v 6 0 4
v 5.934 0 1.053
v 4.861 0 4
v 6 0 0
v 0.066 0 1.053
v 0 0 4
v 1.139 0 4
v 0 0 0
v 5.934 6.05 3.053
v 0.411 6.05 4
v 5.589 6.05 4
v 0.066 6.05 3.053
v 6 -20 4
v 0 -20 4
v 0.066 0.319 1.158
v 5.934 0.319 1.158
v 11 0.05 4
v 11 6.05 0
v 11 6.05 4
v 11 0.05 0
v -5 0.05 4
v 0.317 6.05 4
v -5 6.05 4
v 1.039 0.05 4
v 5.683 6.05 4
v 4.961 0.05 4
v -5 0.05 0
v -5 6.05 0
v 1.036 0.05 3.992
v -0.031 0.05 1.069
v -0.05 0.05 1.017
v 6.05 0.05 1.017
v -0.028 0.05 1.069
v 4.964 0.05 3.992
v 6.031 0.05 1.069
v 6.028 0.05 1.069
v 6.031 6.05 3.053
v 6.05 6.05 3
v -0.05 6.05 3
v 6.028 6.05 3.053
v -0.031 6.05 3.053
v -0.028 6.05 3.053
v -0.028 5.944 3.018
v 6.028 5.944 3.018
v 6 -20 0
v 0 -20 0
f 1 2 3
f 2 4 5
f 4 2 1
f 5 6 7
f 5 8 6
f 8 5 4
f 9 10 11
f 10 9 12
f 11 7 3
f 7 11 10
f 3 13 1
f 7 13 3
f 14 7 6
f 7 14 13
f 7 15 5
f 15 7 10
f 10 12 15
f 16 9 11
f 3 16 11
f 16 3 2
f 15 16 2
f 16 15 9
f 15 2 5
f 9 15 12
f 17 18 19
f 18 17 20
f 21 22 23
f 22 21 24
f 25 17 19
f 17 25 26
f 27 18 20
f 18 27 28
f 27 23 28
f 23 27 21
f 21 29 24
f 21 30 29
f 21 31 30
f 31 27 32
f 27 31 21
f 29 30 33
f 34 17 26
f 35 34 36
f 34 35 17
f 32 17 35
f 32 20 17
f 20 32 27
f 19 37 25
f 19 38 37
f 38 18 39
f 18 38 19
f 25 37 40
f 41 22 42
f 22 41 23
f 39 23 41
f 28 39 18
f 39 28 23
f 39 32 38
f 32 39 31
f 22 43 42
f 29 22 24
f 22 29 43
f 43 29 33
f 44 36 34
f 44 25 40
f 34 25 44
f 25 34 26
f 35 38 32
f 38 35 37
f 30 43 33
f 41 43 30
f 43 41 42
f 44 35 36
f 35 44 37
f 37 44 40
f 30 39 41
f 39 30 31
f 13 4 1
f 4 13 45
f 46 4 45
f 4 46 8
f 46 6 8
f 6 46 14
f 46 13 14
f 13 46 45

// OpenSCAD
/* 
Update 3/17/17 - converted the tongue, groove, male block, and female block into modules. This greatly simplifies the program and eliminated repeated code. Next thinking about adding ability to add multiple tongues and grooves on a single block

Update 3/8/17 - added tolerance gap around tongue and female part, with 1/2 the tolerance removed from both parts. Next thinking about making the male and female tongue parts into modules so they can be placed in other locations, or in multiple locations...
*/


//////////////////User inputed variable////////////////////////////////////////////////////////////

//male or female part
partType="Both";//[Male,Female,Both]

//Number of tongues or grooves - not working yet...
Number_of_Joints=1;//[1,2]

//This is the max width of the tongue
width=6;

//This is the length of the tongue
Tongue_Length=6;

//This is the height of the block that the tongue is attached to
height=4;

//This is the height from the bottom of the block to the bottom of the tongue
height_2=1;

//this is the height of the end of the tongue (Height - Height_2 > height_3 > 0)
height_3=1;

//angle of tongue incut at base
angle =20;

//Additional width of male block, amount wider than tongue
Male_Block_Width = 0;

//Additional width of female block, amount wider than tongue
Female_Block_Width = 10;

//Length of block the tongue is attached to
Male_Block_Length = 20;

//Depth of Female Block (>=0) 
Block_Depth = 0;

//Tolerance Gap to ensure a good fit (0.1 a good starting point assuming exporting using mm) (must be >0 for equations below to be defined
Tolerance=0.1;

///////////////////////////////Calculated variables////////////////////////////////////////////////////

length=Tongue_Length+0.5*Tolerance;  //Tongue length adjusted to include tolerance

height_4 = height-height_2-height_3;  //height of base of tongue

Tongue_Rise_Angle = atan(height_4/length); //angle at which tongue rises from horizontal

z = Tolerance/(2*cos(Tongue_Rise_Angle)); //height of tolerance corrected for angle the tongues rises at

//////////////////////////////Code for generating dovetails based on inputted variables//////////////////////////

//acknowledged problem with displaying in preview mode because difference function 
//as written currently involves coincident faces. Because the F6
//render is not too slow, I'm not fixing it for now...

if(partType=="Male"){
        tongue();
        maleBlock();
}

if (partType=="Female"){
        difference(){ //female block with tongue and 1/2 tolerance cut out on sides and bottom
          femaleBlock();
          groove();
    }
}
if(partType=="Both") { 
    tongue();
    maleBlock();
    difference(){ //female block with tongue and 1/2 tolerance cut out on sides and bottom
          femaleBlock();
          groove();
    }
}
     
/////////////////////////////////MODULES/////////////////////////////////////////////////  
module tongue(){
    color([1,0,0])    
difference(){
    polyhedron(  //tongue polyhedron
        points=[[width-((height-height_2)*tan(angle)),0,height],
                [width,0,height_2],
                [0,0,height_2],
                [(height-height_2)*tan(angle),0,height],
                [width-(height_3)*tan(angle),length,height],
                [width,length,(height-height_3)],
                [0,length,height-height_3],
                [(height_3)*tan(angle),length,height] ],          
        faces=[ [0,1,2],[0,2,3], //base face
                [0,4,1],[1,4,5], //side 1
                [0,3,4],[3,7,4], //top
                [2,7,3],[2,6,7], //side 2
                [1,5,2],[2,5,6], //bottom
                [6,5,4],[4,7,6]] //end
    );

   polyhedron(   //this shaves off the half the tolerance thickness on one side of tongue
        points=[[(height-height_2)*tan(angle),0,height],                             //point 0
                [0,0,height_2],                                                      //point 1                       
                [0.5*Tolerance*sin(90-angle),0,height_2],                            //point 2
                [0.5*Tolerance*sin(90-angle)+(height-height_2)*tan(angle),0,height], //point 3
                [height_3*tan(angle),length,height],                                 //point 4
                [0,length, height -height_3],                                        //point 5
                [0.5*Tolerance*sin(90-angle),length, height-height_3],               //point 6
                [0.5*Tolerance*sin(90-angle)+height_3*tan(angle), length, height]],  //point 7
        faces=[ [0,3,2,1], //back
                [0,4,7,3], //top
                [0,1,5,4], //side 1
                [1,2,6,5], //bottom
                [3,7,6,2], //side 2
                [4,5,6,7]] //front
    );
    
       polyhedron(   //this shaves off half the tolerance thickness on other side of tongue
        points=[[width-(height-height_2)*tan(angle),0,height],                             //point 0
                [width,0,height_2],                                                        //point 1
                [width-0.5*Tolerance*sin(90-angle),0,height_2],                            //point 2
                [width-(height-height_2)*tan(angle)-0.5*Tolerance*sin(90-angle),0,height], //point 3
                [width-height_3*tan(angle),length,height],                                 //point 4
                [width,length, height -height_3],                                          //point 5
                [width-0.5*Tolerance*sin(90-angle),length, height-height_3],               //point 6
                [width-height_3*tan(angle)-0.5*Tolerance*sin(90-angle), length, height]],  //point 7
        faces=[ [0,1,2,3], //back
                [0,3,7,4], //top
                [0,4,5,1], //side 1
                [1,5,6,2], //bottom
                [3,2,6,7], //side 2
                [4,7,6,5]] //front
    );

       polyhedron(   //this shaves off the tolerance half the thickness on the bottom of the tongue
        points=[[width,0,height_2],                                                        //point 0
                [0,0,height_2],                                                            //point 1       
                [z*tan(angle),0,height_2+z],                                               //point 2
                [width-z*tan(angle),0,height_2+z],                                         //point 3
                [width,length,height-height_3],                                            //point 4
                [0,length,height-height_3],                                                //point 5
                [z*tan(angle),length,height-height_3+z],                                   //point 6
                [width-z*tan(angle),length,height-height_3+z]],                            //point 7
        faces=[ [0,1,2,3], //back
                [2,6,7,3], //top
                [1,5,6,2], //side 1
                [0,4,5,1], //bottom
                [7,4,0,3], //side 2
                [4,7,6,5]] //front
                
        );
    }
}
 
 
          
module maleBlock(){
color([1,0,0])translate([-Male_Block_Width/2,-Male_Block_Length,0]){cube([width+Male_Block_Width, Male_Block_Length, height]);}
}
module groove(){
translate([-(Female_Block_Width)/2,0,0]){cube([width+Female_Block_Width, Tolerance/2,height]);}
          polyhedron( //cuts out tongue on female block
               points=[ [width-((height-height_2)*tan(angle)),0,height],    //point 0
                        [width,0,height_2],                                 //point 1
                        [0,0,height_2],                                     //point 2
                        [(height-height_2)*tan(angle),0,height],            //point 3
                        [width-(height_3)*tan(angle),length,height],        //point 4
                        [width,length,(height-height_3)],                   //point 5
                        [0,length,height-height_3],                         //point 6
                        [(height_3)*tan(angle),length,height] ],            //point 7
               faces=[ [0,1,2],[0,2,3],//base face
                       [0,4,1],[1,4,5], //side 1
                       [0,3,4],[3,7,4], //top
                       [2,7,3],[2,6,7], //side 2
                       [1,5,2],[2,5,6], //bottom
                       [6,5,4],[4,7,6]],  //end
               convexity=10);
          
          translate([0,0,height]){linear_extrude(height=1){polygon(  //cuts out extra material above tongue, may be unnecessary
               points=[ [width-((height-height_2)*tan(angle)),0],
                        [(height-height_2)*tan(angle),0],
                        [(height_3)*tan(angle),length],
                        [width-(height_3)*tan(angle),length]]);   
          }}
    
   polyhedron(   //this shaves off half the tolerance thickness on one side of tongue
        points=[[(height-height_2)*tan(angle),0,height],                             //point 0
                [0,0,height_2],                                                      //point 1                       
                [-0.5*Tolerance*sin(90-angle),0,height_2],                            //point 2
                [-0.5*Tolerance*sin(90-angle)+(height-height_2)*tan(angle),0,height], //point 3
                [height_3*tan(angle),length,height],                                 //point 4
                [0,length, height -height_3],                                        //point 5
                [-0.5*Tolerance*sin(90-angle),length, height-height_3],               //point 6
                [-0.5*Tolerance*sin(90-angle)+height_3*tan(angle), length, height]],  //point 7
        faces=[ [0,3,2,1], //back
                [0,4,7,3], //top
                [0,1,5,4], //side 1
                [1,2,6,5], //bottom
                [3,7,6,2], //side 2
                [4,5,6,7]] //front
       );
    
   polyhedron(   //this shaves off half the tolerance thickness on other side of tongue
        points=[[width-(height-height_2)*tan(angle),0,height],                             //point 0
                [width,0,height_2],                                                        //point 1                     
                [width+0.5*Tolerance*sin(90-angle),0,height_2],                            //point 2
                [width-(height-height_2)*tan(angle)+0.5*Tolerance*sin(90-angle),0,height], //point 3
                [width-height_3*tan(angle),length,height],                                 //point 4
                [width,length, height -height_3],                                          //point 5
                [width+0.5*Tolerance*sin(90-angle),length, height-height_3],               //point 6
                [width-height_3*tan(angle)+0.5*Tolerance*sin(90-angle), length, height]],  //point 7
        faces=[ [0,1,2,3], //back
                [0,3,7,4], //top
                [0,4,5,1], //side 1
                [1,5,6,2], //bottom
                [3,2,6,7], //side 2
                [4,7,6,5]] //front
        );

       polyhedron(   //this shaves off half the tolerance thickness on the bottom of the tongue
        points=[[width+Tolerance/2,0,height_2],                               //point 0
                [-Tolerance/2,0,height_2],                                    //point 1       
                [-Tolerance/2+z*tan(angle),0,height_2+z],                     //point 2
                [Tolerance/2+width-z*tan(angle),0,height_2+z],                //point 3
                [width+Tolerance/2,length,height-height_3],                   //point 4
                [-Tolerance/2,length,height-height_3],                        //point 5
                [-Tolerance/2+z*tan(angle),length,height-height_3+z],         //point 6
                [width-z*tan(angle)+Tolerance/2,length,height-height_3+z]],   //point 7
        faces=[ [0,1,2,3], //back
                [2,6,7,3], //top
                [1,5,6,2], //side 1
                [0,4,5,1], //bottom
                [7,4,0,3], //side 2
                [4,7,6,5]] //front           
    );
}
module femaleBlock(){
translate([-(Female_Block_Width)/2,0,0]){cube([width+Female_Block_Width, length+Block_Depth,height]);}
}
